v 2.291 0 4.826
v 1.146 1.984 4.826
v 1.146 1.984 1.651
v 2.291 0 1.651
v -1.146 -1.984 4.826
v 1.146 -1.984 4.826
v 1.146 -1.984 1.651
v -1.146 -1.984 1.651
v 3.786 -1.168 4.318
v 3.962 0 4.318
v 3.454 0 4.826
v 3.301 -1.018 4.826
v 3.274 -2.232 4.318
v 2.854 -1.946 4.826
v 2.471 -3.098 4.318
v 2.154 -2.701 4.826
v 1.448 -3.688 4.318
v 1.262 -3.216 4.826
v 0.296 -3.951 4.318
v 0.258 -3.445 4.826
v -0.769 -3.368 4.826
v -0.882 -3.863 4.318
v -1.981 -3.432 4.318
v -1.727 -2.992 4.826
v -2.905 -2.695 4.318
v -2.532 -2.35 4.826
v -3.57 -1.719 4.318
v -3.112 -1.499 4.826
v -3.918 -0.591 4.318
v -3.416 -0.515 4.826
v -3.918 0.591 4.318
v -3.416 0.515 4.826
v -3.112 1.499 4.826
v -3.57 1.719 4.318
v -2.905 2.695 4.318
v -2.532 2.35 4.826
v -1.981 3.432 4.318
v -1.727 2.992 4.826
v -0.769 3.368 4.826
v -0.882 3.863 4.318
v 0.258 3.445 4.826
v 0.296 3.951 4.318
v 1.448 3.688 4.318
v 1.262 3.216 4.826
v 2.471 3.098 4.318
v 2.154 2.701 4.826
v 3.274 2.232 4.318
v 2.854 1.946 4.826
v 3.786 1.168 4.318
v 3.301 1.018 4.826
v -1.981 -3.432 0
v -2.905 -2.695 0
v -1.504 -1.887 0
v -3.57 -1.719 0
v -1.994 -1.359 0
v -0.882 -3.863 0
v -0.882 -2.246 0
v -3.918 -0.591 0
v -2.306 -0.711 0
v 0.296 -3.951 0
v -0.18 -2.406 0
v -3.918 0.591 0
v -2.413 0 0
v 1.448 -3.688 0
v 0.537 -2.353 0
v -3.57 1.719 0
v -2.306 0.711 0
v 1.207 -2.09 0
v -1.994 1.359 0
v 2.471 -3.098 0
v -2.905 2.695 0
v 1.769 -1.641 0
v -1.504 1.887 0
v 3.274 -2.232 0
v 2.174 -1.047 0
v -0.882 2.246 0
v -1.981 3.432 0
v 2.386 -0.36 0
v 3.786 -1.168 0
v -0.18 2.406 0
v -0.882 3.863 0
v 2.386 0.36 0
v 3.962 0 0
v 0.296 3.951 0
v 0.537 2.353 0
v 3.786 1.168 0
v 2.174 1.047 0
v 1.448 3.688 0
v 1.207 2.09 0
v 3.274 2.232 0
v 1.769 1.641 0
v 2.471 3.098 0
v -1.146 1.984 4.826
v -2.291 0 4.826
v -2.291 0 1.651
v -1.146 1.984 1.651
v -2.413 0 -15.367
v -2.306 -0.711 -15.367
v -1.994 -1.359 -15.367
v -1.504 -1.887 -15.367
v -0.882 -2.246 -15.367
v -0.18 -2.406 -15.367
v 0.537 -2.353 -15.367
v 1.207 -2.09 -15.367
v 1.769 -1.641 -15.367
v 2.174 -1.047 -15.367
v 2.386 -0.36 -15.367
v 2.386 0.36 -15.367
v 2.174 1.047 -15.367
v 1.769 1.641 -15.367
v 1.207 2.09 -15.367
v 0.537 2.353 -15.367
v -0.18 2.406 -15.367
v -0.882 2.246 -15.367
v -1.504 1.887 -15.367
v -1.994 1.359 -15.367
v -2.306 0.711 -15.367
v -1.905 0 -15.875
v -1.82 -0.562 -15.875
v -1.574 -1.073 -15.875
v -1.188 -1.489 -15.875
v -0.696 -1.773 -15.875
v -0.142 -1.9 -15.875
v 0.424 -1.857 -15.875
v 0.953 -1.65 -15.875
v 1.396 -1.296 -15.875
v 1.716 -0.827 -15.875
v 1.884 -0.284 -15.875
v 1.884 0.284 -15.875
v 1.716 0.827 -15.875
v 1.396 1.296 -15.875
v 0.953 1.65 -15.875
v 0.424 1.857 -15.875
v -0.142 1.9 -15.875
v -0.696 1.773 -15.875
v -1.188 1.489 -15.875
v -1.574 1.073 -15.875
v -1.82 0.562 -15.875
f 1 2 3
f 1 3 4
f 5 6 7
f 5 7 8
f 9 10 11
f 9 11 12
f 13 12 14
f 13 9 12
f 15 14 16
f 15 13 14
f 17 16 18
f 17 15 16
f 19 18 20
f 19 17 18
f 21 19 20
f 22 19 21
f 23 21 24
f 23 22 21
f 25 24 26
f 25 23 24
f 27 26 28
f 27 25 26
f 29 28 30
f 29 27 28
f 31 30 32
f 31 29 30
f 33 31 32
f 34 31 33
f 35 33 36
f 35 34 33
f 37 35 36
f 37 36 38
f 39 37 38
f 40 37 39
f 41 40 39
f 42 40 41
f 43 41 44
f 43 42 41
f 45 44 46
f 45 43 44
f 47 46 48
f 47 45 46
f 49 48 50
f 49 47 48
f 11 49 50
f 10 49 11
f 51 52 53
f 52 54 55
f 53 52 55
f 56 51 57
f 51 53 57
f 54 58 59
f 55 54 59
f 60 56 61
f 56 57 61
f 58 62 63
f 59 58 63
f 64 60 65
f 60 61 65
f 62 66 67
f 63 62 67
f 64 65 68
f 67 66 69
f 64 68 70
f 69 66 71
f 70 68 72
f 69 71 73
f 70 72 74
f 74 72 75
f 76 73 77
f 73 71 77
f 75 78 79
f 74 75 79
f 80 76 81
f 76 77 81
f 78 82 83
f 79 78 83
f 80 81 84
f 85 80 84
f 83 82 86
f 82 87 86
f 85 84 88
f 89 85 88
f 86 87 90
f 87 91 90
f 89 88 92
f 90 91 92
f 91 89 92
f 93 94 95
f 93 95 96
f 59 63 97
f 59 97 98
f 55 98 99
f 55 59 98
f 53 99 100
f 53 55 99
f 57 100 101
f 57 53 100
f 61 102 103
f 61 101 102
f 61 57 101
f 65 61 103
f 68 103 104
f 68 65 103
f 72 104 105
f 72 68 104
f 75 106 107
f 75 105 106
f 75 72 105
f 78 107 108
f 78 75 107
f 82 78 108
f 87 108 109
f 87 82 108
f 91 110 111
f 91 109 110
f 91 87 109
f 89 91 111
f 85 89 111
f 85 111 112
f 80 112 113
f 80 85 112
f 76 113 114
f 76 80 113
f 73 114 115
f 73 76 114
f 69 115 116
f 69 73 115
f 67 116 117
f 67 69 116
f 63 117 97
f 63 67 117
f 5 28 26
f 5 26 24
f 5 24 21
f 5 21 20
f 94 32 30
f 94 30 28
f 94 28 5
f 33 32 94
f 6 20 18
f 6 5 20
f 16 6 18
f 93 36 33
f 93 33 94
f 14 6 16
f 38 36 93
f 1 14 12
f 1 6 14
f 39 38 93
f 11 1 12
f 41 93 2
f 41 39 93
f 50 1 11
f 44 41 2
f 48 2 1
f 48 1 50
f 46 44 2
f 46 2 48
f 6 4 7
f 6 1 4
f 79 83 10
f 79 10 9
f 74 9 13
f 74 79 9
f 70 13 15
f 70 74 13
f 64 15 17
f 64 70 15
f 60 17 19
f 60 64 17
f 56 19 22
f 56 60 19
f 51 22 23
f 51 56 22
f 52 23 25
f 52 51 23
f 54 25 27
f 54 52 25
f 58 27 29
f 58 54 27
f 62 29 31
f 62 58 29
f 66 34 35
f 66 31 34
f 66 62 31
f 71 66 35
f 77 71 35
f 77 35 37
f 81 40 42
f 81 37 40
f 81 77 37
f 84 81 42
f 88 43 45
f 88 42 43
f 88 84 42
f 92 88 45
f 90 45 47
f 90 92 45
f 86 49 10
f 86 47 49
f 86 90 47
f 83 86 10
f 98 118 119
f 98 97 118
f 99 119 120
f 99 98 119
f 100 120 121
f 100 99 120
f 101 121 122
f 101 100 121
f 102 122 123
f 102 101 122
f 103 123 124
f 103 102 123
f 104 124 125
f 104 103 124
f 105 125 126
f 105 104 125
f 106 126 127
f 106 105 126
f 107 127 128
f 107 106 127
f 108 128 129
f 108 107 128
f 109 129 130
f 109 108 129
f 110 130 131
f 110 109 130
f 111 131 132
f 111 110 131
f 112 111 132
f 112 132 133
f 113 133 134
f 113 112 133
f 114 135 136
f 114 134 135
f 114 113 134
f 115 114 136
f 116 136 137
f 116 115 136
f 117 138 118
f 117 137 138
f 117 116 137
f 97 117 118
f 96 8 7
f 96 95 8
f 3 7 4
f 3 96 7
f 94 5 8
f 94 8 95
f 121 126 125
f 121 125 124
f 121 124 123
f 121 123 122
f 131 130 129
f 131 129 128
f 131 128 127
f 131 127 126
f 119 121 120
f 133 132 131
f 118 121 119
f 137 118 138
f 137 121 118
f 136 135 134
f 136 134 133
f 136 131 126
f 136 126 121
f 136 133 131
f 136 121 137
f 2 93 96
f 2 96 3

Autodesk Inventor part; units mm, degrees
ref_plane "YZ Plane" through (0, 0, 0) normal (1, 0, 0) x (0, 1, 0)
ref_plane "XZ Plane" through (0, 0, 0) normal (0, 1, 0) x (-1, 0, 0)
ref_plane "XY Plane" through (0, 0, 0) normal (0, 0, 1) x (1, 0, 0)
sketch "Sketch1" plane through (0, 0, 0) normal (0, 0, 1) x (1, 0, 0)
  circle A0 centre (0, 0) radius 3.9624
  dimension "d0" = 7.9248
extrude "Extrusion1" add sketch "Sketch1" along normal blind 4.826
sketch "Sketch2" plane through (0, 0, 0) normal (0, 0, -1) x (-1, 0, 0)
  circle A0 centre (0, 0) radius 3.9624 projected
  circle A1 centre (0, 0) radius 2.413
  dimension "d3" = 4.826
extrude "Extrusion2" add sketch "Sketch2" along normal blind 15.875 contours A1
sketch "Sketch3" plane through (0, 0, 4.826) normal (0, 0, 1) x (1, 0, 0)
  circle A0 centre (0, 0) radius 3.9624 projected
  line L0 (-1.1457, 1.9844) -> (1.1457, 1.9844)
  line L1 (1.1457, 1.9844) -> (2.2914, 0)
  line L2 (2.2914, 0) -> (1.1457, -1.9844)
  line L3 (1.1457, -1.9844) -> (-1.1457, -1.9844)
  line L4 (-1.1457, -1.9844) -> (-2.2914, 0)
  line L5 (-2.2914, 0) -> (-1.1457, 1.9844)
  dimension "d6" = 3.9688
extrude "Extrusion3" cut sketch "Sketch3" against normal blind 3.175 contours L0 L1 L2 L3 L4 L5
thread "Thread1" size "10-32 UNF" class "2A" standard "ANSI Unified Screw Threads" full length
chamfer "Chamfer1" distance 0.508 angle 45 1 edges at (2.413, 0, -15.875)
chamfer "Chamfer2" distance 0.508 angle 45 1 edges at (-3.9624, 0, 4.826)
properties part number "10-32 x1000" material "Steel"
